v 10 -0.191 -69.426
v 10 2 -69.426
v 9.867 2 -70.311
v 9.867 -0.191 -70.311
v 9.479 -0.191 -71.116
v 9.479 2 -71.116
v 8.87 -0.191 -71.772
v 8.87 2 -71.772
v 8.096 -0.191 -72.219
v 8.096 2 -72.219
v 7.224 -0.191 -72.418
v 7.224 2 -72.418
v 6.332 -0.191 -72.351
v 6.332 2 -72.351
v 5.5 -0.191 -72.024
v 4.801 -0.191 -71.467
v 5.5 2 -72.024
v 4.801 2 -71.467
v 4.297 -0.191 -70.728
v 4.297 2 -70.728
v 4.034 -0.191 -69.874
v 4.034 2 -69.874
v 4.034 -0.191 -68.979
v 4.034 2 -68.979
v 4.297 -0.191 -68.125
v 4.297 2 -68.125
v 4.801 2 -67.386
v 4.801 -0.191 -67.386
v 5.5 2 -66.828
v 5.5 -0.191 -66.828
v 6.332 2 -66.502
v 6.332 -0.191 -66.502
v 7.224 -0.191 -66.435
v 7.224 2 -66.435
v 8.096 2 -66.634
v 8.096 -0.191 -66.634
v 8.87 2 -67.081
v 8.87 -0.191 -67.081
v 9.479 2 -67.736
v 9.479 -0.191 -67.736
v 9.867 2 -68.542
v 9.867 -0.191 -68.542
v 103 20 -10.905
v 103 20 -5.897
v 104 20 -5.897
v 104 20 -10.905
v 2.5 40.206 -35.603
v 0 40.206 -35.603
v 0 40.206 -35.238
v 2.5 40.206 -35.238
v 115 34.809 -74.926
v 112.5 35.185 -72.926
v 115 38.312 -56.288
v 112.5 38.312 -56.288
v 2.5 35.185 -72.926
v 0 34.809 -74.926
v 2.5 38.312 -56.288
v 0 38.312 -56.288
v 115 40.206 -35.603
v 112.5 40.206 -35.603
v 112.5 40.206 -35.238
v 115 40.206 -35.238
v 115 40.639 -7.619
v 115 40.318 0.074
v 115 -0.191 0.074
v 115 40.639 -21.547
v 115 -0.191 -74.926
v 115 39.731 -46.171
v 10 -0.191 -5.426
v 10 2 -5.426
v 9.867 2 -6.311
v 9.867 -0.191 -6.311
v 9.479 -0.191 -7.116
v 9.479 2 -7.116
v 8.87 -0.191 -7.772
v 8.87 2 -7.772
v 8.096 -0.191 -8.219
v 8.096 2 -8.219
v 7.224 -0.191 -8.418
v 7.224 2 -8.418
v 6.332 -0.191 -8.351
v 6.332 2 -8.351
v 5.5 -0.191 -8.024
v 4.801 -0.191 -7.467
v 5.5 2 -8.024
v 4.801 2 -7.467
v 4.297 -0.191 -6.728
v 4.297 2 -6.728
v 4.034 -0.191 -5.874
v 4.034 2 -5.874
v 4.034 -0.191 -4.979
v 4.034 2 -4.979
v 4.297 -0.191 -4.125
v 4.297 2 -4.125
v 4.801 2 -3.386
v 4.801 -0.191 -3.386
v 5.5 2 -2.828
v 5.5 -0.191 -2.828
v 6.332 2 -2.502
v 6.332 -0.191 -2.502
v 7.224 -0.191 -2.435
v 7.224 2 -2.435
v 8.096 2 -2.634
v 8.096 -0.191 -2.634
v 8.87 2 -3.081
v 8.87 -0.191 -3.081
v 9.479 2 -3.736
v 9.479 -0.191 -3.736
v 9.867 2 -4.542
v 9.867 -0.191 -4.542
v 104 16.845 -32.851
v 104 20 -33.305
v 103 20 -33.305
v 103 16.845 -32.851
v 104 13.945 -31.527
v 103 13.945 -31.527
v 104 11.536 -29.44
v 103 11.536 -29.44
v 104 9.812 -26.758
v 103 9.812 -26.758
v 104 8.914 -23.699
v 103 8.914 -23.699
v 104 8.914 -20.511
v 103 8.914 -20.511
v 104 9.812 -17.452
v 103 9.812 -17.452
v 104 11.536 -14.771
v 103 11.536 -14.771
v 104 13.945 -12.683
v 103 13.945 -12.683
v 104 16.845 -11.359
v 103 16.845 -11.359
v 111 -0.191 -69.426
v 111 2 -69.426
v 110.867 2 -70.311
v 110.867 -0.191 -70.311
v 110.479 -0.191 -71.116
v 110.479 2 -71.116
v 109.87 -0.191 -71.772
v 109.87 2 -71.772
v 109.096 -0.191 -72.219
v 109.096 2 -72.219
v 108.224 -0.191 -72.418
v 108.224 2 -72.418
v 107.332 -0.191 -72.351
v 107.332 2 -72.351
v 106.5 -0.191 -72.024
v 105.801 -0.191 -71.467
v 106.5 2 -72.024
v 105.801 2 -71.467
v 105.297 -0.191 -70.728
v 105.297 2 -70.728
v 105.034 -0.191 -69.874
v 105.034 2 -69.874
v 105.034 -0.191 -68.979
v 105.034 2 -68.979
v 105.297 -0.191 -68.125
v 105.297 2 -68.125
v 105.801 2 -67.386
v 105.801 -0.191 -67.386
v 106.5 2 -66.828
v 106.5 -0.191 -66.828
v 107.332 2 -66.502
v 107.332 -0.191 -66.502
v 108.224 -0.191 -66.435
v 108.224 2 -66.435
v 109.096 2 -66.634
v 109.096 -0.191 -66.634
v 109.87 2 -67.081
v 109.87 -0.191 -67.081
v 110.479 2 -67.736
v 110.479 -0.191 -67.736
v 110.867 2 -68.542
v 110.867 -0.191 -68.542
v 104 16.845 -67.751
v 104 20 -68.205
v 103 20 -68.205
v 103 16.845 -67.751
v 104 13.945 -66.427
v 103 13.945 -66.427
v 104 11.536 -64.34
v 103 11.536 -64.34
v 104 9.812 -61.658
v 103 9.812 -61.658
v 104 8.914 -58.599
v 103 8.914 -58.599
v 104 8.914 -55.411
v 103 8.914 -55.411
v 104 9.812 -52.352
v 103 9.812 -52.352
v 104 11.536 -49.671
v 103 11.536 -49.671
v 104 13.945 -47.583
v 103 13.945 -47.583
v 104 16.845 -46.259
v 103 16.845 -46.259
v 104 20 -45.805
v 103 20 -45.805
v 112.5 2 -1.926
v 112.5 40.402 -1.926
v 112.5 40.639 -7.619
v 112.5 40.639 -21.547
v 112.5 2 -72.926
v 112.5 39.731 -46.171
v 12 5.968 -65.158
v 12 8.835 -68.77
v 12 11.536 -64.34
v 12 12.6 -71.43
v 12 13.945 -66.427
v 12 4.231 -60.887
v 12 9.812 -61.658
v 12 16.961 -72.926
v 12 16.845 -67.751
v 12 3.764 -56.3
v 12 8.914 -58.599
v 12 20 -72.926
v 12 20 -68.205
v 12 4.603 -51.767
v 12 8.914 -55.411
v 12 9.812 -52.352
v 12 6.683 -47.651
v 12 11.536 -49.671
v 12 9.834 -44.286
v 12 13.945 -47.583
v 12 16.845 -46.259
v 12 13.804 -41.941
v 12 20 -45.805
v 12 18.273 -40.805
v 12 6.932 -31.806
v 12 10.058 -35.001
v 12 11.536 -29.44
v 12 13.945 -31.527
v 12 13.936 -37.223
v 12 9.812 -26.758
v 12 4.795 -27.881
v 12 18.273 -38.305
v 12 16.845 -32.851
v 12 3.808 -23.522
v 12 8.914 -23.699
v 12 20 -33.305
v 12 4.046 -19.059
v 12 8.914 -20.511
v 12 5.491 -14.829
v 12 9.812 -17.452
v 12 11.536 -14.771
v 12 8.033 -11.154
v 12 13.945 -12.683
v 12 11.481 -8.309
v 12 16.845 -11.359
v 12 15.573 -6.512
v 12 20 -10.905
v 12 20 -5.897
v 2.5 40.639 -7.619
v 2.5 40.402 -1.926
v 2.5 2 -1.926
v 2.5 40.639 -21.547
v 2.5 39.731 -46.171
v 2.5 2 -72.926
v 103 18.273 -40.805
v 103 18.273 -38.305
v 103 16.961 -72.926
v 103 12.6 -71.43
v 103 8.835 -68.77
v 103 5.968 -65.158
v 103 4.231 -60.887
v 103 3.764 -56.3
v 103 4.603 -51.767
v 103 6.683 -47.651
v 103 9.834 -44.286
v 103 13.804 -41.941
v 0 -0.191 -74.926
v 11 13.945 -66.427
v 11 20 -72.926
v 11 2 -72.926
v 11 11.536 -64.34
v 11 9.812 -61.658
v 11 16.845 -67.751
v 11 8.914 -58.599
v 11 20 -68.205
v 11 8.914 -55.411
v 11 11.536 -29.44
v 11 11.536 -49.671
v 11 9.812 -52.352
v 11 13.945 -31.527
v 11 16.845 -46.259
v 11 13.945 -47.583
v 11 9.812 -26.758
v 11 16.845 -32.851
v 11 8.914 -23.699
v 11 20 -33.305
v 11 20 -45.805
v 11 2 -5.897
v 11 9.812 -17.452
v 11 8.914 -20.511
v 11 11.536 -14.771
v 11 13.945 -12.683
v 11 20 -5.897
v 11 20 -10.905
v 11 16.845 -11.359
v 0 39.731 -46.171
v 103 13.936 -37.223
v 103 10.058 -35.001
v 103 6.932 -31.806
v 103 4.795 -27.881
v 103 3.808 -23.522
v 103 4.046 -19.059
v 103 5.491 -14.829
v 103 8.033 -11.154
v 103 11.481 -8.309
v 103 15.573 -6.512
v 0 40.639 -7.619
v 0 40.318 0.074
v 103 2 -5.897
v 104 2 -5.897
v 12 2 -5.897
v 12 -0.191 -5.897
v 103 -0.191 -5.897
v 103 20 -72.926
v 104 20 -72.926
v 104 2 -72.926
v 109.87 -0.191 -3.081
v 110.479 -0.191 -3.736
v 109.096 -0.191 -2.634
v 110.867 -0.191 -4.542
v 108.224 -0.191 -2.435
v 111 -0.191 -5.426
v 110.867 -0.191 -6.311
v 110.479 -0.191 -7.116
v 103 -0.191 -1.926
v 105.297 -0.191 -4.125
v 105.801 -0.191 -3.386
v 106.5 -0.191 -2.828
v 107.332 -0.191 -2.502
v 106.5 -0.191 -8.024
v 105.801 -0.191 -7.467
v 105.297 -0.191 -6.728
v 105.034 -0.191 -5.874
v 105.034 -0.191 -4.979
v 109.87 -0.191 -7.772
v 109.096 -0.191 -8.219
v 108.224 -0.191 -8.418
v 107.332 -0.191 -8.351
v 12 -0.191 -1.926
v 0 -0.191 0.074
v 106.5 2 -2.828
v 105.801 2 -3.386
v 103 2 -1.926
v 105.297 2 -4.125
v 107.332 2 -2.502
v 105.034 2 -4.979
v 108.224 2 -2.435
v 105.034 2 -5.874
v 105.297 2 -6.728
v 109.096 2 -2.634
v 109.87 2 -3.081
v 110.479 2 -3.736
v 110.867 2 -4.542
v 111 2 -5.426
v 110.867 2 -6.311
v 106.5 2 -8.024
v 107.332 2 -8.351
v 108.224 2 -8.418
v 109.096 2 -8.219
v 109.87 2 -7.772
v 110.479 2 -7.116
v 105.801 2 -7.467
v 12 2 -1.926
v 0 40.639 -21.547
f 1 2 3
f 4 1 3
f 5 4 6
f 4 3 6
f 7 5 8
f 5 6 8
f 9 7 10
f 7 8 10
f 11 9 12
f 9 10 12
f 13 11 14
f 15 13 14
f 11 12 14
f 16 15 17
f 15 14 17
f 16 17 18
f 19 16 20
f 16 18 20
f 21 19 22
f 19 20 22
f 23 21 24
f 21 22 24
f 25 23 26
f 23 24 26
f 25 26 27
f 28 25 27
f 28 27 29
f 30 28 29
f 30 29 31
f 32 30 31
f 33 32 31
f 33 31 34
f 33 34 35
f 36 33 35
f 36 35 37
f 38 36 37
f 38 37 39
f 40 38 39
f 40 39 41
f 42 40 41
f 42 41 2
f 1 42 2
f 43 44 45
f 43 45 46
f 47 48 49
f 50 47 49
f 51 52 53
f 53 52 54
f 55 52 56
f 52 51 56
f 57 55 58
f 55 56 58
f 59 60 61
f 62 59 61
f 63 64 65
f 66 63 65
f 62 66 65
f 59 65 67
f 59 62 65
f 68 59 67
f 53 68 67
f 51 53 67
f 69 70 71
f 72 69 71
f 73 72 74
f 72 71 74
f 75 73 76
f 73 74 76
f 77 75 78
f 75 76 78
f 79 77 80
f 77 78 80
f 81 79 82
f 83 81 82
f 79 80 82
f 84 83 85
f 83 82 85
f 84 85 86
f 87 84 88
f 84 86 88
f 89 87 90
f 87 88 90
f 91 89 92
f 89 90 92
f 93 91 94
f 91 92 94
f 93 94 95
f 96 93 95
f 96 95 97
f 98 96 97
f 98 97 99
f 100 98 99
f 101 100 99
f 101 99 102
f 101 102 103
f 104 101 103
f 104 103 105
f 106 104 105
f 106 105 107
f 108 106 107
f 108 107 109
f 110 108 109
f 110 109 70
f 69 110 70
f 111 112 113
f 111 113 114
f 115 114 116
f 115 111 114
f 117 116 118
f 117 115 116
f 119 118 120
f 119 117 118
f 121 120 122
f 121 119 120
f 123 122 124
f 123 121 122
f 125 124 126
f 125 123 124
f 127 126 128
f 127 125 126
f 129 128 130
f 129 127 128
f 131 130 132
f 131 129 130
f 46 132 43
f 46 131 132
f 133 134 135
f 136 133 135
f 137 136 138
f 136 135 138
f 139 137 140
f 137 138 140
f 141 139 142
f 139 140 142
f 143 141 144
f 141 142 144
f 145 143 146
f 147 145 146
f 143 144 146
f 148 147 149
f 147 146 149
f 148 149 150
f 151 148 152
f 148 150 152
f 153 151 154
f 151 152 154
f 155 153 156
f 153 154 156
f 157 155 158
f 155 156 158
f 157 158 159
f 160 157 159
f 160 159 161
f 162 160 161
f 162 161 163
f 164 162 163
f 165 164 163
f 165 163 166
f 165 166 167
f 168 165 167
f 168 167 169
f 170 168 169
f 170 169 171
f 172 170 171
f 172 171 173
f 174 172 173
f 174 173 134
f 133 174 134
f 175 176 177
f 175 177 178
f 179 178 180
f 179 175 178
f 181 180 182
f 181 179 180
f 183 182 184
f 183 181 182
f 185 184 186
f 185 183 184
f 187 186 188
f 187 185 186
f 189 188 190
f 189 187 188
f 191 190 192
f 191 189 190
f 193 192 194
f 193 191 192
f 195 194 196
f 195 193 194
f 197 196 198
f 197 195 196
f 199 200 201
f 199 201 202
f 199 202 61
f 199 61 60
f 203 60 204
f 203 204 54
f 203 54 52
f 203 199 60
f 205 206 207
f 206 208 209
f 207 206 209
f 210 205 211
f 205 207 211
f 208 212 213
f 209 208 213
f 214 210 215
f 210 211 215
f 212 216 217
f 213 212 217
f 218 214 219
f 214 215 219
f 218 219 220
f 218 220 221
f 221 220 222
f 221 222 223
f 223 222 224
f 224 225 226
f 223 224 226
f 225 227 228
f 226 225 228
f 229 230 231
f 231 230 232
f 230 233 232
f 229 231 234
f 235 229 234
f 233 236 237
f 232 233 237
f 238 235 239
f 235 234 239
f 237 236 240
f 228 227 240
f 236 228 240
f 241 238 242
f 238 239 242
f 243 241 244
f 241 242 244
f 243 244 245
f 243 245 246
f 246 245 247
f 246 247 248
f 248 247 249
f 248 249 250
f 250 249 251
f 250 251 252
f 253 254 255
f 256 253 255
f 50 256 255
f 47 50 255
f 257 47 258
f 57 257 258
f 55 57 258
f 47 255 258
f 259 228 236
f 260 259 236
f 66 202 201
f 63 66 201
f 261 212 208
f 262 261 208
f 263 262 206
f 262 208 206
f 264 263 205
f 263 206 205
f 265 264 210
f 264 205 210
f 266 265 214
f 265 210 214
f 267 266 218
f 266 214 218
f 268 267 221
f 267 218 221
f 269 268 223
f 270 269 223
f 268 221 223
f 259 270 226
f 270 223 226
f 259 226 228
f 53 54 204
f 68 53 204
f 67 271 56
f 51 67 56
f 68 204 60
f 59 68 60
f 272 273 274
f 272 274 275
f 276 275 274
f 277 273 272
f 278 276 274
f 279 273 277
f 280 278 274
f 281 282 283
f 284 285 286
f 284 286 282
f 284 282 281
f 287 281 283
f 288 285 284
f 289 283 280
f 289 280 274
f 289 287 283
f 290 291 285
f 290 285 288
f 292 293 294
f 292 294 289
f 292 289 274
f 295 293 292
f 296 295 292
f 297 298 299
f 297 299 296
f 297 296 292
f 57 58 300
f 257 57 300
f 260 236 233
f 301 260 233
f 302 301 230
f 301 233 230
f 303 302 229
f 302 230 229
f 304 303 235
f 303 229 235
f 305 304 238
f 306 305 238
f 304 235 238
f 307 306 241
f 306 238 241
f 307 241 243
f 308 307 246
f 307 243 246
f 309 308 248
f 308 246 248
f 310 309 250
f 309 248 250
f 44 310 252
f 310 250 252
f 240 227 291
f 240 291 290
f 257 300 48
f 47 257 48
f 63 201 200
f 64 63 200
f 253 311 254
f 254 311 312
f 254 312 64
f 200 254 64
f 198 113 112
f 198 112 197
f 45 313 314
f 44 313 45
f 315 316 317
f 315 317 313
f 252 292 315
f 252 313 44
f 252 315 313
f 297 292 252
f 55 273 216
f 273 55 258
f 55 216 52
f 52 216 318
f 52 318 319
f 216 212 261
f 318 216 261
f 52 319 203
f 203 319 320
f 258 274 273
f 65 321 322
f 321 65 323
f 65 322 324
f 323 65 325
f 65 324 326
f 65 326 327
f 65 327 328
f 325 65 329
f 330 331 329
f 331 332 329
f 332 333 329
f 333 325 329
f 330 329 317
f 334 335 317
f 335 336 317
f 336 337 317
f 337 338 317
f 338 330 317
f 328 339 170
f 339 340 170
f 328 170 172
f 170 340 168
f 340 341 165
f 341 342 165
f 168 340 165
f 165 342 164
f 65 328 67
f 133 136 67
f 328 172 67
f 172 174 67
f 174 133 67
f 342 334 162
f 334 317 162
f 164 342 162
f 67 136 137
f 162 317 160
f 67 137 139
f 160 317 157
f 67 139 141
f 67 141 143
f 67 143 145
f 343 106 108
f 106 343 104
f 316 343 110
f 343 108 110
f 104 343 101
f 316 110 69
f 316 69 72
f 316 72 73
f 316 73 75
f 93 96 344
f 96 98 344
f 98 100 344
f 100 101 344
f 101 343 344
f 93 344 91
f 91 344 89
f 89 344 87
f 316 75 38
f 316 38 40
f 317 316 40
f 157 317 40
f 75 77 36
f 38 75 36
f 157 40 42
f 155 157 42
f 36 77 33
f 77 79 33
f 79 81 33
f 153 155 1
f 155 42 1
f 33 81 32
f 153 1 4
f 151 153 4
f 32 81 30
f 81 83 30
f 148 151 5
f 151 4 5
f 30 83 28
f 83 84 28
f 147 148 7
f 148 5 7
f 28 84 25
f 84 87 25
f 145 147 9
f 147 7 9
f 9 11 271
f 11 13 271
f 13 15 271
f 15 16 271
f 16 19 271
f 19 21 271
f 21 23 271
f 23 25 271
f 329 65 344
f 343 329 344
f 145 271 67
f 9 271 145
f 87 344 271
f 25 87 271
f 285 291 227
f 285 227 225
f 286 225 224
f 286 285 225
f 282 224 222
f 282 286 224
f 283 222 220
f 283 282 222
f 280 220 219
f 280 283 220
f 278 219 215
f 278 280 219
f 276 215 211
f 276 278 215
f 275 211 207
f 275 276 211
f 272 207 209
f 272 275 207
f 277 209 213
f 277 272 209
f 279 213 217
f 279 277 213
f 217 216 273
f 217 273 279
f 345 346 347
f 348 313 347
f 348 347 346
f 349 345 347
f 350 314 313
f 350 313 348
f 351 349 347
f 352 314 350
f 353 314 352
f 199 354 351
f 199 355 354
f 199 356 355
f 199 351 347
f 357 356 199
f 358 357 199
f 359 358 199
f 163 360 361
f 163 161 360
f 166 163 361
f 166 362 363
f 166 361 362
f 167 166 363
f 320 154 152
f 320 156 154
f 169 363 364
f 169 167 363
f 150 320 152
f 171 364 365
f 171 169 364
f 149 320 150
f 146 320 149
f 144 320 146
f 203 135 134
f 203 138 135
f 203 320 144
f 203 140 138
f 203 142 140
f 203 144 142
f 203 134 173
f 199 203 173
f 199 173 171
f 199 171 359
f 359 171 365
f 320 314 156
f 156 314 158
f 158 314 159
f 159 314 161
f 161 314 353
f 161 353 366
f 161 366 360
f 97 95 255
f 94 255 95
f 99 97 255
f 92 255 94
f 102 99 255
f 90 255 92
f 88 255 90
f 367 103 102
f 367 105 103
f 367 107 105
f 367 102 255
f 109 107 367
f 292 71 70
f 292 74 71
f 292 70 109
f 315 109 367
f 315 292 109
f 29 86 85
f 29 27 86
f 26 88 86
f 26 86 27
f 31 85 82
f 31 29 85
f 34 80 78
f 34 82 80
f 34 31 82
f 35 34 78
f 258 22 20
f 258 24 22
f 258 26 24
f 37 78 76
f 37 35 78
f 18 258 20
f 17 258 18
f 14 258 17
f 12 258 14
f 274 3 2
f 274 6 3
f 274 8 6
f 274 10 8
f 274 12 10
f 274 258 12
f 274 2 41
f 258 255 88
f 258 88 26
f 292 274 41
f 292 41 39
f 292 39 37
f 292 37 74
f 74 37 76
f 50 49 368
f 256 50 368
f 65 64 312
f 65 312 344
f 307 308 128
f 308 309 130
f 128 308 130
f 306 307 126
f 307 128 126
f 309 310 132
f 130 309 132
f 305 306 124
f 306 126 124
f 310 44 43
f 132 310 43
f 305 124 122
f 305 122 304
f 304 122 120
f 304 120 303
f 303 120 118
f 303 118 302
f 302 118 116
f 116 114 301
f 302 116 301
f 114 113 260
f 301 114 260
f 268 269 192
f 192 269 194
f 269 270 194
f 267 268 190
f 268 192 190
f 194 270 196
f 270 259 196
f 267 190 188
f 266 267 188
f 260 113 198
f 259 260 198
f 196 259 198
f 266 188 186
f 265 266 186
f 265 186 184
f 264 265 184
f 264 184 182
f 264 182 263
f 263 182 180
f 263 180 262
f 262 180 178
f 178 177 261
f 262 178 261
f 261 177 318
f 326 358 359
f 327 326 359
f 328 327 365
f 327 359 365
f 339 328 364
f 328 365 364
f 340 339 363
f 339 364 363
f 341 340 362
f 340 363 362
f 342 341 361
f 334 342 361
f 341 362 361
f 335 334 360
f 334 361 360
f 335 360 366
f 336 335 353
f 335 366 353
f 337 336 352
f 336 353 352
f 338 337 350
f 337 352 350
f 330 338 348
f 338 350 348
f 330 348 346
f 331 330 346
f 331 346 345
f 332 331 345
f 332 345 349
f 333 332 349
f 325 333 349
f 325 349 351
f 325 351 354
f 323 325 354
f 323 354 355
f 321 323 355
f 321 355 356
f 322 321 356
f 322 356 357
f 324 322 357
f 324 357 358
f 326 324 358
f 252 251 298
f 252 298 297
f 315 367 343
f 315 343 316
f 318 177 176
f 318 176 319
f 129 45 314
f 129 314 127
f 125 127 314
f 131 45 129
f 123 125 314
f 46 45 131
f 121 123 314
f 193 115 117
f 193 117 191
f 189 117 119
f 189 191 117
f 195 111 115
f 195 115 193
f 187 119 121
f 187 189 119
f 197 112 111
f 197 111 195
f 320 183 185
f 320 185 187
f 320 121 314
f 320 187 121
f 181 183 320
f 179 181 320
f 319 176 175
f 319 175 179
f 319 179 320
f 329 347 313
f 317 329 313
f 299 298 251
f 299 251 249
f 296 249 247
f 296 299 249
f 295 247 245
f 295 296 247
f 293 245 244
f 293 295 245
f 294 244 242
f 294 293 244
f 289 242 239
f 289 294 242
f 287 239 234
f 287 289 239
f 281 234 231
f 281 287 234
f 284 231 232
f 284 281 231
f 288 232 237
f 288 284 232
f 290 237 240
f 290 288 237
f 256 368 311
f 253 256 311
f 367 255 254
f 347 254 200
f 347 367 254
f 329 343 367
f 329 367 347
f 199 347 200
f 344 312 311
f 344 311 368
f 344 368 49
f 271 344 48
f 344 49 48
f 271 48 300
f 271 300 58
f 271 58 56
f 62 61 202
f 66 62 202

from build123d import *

# Parameters (mm, degrees)
BOSS_EXTRUDE6_DEPTH = 115
CUT_EXTRUDE5_START  = 2
SKETCH17_W          = 110
SKETCH17_H          = 71
CUT_EXTRUDE5_DEPTH  = 115
BOSS_EXTRUDE7_START = -12
BOSS_EXTRUDE7_DEPTH = 91
SKETCH22_R          = 3
SKETCH22_W          = 91
SKETCH22_H          = 3.970785373
CUT_EXTRUDE6_DEPTH  = 3.191306198
BOSS_EXTRUDE8_START = -12
SKETCH23_W          = 67.315835607
SKETCH23_H          = 18
BOSS_EXTRUDE8_DEPTH = 1
BOSS_EXTRUDE9_START = -12
SKETCH24_W          = 67.315835607
SKETCH24_H          = 18
BOSS_EXTRUDE9_DEPTH = 1
CUT_EXTRUDE7_DEPTH  = 1
CUT_EXTRUDE8_DEPTH  = 1


with BuildPart() as part:
    # Sketch16 → Boss-Extrude6 (new body)
    with BuildSketch(Plane(origin=(0, 0, 0), x_dir=(0, 0, -1), z_dir=(1, 0, 0))):
        Polygon((21.546513219, 40.639365956), (7.618622676, 40.639365956), (-0.073583226, 40.318426006), (-0.073583226, -0.191306198), (74.926416774, -0.191306198), (74.926416774, 34.808693802), (56.287613548, 38.312228243), (46.171210173, 39.731159859), (35.60256896, 40.205500696), (35.23833782, 40.205500696), align=None)
    extrude(amount=BOSS_EXTRUDE6_DEPTH)

    # Sketch17 → Cut-Extrude5 (cut)
    with BuildSketch(Plane(origin=(0, 0, 0), x_dir=(1, 0, 0), z_dir=(0, 1, 0)).offset(CUT_EXTRUDE5_START)):
        with Locations((57.5, 37.426416774)):
            Rectangle(SKETCH17_W, SKETCH17_H)
    extrude(amount=CUT_EXTRUDE5_DEPTH, mode=Mode.SUBTRACT)

    # Sketch21 → Boss-Extrude7 (add)
    with BuildSketch(Plane.ZY.offset(BOSS_EXTRUDE7_START)):
        with BuildLine():
            Line((-73.213037754, 2), (-73.213037754, 20))
            ThreePointArc((-73.213037754, 20), (-57.828004717, 3.773036878), (-40.805119951, 18.272518522))
            Line((-40.805119951, 18.272518522), (-38.305119951, 18.272518522))
            ThreePointArc((-38.305119951, 18.272518522), (-21.282235184, 3.773036878), (-5.897202147, 20))
            Line((-5.897202147, 20), (-5.897202147, 2))
            Line((-5.897202147, 2), (-73.213037754, 2))
        make_face()
    extrude(amount=-BOSS_EXTRUDE7_DEPTH)

    # Sketch22 → Cut-Extrude6 (cut, through all)
    with BuildSketch(Plane(origin=(0, 2, 0), x_dir=(1, 0, 0), z_dir=(0, 1, 0))):
        with Locations((7, 69.426416774)):
            Circle(SKETCH22_R)
        with Locations((108, 69.426416774)):
            Circle(SKETCH22_R)
        with Locations((108, 5.426416774)):
            Circle(SKETCH22_R)
        with Locations((7, 5.426416774)):
            Circle(SKETCH22_R)
        with Locations((57.5, 3.911809461)):
            Rectangle(SKETCH22_W, SKETCH22_H)
    extrude(amount=-CUT_EXTRUDE6_DEPTH, mode=Mode.SUBTRACT)

    # Sketch23 → Boss-Extrude8 (add)
    with BuildSketch(Plane.ZY.offset(BOSS_EXTRUDE8_START)):
        with Locations((-39.55511995, 11)):
            Rectangle(SKETCH23_W, SKETCH23_H)
    extrude(amount=BOSS_EXTRUDE8_DEPTH)

    # Sketch24 → Boss-Extrude9 (add)
    with BuildSketch(Plane(origin=(115, 0, 0), x_dir=(0, 0, -1), z_dir=(1, 0, 0)).offset(BOSS_EXTRUDE9_START)):
        with Locations((39.55511995, 11)):
            Rectangle(SKETCH24_W, SKETCH24_H)
    extrude(amount=BOSS_EXTRUDE9_DEPTH)

    # Sketch25 → Cut-Extrude7 (cut)
    with BuildSketch(Plane.ZY.offset(-11)):
        with BuildLine():
            Line((-68.205119951, 20), (-45.805119951, 20))
            ThreePointArc((-45.805119951, 20), (-57.005119951, 8.8), (-68.205119951, 20))
        make_face()
        with BuildLine():
            Line((-33.305119951, 20), (-10.905119951, 20))
            ThreePointArc((-10.905119951, 20), (-22.105119951, 8.8), (-33.305119951, 20))
        make_face()
    extrude(amount=-CUT_EXTRUDE7_DEPTH, mode=Mode.SUBTRACT)

    # Sketch26 → Cut-Extrude8 (cut)
    with BuildSketch(Plane(origin=(104, 0, 0), x_dir=(0, 0, -1), z_dir=(1, 0, 0))):
        with BuildLine():
            Line((10.905119951, 20), (33.305119951, 20))
            ThreePointArc((33.305119951, 20), (22.105119951, 8.8), (10.905119951, 20))
        make_face()
        with BuildLine():
            Line((45.805119951, 20), (68.205119951, 20))
            ThreePointArc((68.205119951, 20), (57.005119951, 8.8), (45.805119951, 20))
        make_face()
    extrude(amount=-CUT_EXTRUDE8_DEPTH, mode=Mode.SUBTRACT)


solid = part.part
